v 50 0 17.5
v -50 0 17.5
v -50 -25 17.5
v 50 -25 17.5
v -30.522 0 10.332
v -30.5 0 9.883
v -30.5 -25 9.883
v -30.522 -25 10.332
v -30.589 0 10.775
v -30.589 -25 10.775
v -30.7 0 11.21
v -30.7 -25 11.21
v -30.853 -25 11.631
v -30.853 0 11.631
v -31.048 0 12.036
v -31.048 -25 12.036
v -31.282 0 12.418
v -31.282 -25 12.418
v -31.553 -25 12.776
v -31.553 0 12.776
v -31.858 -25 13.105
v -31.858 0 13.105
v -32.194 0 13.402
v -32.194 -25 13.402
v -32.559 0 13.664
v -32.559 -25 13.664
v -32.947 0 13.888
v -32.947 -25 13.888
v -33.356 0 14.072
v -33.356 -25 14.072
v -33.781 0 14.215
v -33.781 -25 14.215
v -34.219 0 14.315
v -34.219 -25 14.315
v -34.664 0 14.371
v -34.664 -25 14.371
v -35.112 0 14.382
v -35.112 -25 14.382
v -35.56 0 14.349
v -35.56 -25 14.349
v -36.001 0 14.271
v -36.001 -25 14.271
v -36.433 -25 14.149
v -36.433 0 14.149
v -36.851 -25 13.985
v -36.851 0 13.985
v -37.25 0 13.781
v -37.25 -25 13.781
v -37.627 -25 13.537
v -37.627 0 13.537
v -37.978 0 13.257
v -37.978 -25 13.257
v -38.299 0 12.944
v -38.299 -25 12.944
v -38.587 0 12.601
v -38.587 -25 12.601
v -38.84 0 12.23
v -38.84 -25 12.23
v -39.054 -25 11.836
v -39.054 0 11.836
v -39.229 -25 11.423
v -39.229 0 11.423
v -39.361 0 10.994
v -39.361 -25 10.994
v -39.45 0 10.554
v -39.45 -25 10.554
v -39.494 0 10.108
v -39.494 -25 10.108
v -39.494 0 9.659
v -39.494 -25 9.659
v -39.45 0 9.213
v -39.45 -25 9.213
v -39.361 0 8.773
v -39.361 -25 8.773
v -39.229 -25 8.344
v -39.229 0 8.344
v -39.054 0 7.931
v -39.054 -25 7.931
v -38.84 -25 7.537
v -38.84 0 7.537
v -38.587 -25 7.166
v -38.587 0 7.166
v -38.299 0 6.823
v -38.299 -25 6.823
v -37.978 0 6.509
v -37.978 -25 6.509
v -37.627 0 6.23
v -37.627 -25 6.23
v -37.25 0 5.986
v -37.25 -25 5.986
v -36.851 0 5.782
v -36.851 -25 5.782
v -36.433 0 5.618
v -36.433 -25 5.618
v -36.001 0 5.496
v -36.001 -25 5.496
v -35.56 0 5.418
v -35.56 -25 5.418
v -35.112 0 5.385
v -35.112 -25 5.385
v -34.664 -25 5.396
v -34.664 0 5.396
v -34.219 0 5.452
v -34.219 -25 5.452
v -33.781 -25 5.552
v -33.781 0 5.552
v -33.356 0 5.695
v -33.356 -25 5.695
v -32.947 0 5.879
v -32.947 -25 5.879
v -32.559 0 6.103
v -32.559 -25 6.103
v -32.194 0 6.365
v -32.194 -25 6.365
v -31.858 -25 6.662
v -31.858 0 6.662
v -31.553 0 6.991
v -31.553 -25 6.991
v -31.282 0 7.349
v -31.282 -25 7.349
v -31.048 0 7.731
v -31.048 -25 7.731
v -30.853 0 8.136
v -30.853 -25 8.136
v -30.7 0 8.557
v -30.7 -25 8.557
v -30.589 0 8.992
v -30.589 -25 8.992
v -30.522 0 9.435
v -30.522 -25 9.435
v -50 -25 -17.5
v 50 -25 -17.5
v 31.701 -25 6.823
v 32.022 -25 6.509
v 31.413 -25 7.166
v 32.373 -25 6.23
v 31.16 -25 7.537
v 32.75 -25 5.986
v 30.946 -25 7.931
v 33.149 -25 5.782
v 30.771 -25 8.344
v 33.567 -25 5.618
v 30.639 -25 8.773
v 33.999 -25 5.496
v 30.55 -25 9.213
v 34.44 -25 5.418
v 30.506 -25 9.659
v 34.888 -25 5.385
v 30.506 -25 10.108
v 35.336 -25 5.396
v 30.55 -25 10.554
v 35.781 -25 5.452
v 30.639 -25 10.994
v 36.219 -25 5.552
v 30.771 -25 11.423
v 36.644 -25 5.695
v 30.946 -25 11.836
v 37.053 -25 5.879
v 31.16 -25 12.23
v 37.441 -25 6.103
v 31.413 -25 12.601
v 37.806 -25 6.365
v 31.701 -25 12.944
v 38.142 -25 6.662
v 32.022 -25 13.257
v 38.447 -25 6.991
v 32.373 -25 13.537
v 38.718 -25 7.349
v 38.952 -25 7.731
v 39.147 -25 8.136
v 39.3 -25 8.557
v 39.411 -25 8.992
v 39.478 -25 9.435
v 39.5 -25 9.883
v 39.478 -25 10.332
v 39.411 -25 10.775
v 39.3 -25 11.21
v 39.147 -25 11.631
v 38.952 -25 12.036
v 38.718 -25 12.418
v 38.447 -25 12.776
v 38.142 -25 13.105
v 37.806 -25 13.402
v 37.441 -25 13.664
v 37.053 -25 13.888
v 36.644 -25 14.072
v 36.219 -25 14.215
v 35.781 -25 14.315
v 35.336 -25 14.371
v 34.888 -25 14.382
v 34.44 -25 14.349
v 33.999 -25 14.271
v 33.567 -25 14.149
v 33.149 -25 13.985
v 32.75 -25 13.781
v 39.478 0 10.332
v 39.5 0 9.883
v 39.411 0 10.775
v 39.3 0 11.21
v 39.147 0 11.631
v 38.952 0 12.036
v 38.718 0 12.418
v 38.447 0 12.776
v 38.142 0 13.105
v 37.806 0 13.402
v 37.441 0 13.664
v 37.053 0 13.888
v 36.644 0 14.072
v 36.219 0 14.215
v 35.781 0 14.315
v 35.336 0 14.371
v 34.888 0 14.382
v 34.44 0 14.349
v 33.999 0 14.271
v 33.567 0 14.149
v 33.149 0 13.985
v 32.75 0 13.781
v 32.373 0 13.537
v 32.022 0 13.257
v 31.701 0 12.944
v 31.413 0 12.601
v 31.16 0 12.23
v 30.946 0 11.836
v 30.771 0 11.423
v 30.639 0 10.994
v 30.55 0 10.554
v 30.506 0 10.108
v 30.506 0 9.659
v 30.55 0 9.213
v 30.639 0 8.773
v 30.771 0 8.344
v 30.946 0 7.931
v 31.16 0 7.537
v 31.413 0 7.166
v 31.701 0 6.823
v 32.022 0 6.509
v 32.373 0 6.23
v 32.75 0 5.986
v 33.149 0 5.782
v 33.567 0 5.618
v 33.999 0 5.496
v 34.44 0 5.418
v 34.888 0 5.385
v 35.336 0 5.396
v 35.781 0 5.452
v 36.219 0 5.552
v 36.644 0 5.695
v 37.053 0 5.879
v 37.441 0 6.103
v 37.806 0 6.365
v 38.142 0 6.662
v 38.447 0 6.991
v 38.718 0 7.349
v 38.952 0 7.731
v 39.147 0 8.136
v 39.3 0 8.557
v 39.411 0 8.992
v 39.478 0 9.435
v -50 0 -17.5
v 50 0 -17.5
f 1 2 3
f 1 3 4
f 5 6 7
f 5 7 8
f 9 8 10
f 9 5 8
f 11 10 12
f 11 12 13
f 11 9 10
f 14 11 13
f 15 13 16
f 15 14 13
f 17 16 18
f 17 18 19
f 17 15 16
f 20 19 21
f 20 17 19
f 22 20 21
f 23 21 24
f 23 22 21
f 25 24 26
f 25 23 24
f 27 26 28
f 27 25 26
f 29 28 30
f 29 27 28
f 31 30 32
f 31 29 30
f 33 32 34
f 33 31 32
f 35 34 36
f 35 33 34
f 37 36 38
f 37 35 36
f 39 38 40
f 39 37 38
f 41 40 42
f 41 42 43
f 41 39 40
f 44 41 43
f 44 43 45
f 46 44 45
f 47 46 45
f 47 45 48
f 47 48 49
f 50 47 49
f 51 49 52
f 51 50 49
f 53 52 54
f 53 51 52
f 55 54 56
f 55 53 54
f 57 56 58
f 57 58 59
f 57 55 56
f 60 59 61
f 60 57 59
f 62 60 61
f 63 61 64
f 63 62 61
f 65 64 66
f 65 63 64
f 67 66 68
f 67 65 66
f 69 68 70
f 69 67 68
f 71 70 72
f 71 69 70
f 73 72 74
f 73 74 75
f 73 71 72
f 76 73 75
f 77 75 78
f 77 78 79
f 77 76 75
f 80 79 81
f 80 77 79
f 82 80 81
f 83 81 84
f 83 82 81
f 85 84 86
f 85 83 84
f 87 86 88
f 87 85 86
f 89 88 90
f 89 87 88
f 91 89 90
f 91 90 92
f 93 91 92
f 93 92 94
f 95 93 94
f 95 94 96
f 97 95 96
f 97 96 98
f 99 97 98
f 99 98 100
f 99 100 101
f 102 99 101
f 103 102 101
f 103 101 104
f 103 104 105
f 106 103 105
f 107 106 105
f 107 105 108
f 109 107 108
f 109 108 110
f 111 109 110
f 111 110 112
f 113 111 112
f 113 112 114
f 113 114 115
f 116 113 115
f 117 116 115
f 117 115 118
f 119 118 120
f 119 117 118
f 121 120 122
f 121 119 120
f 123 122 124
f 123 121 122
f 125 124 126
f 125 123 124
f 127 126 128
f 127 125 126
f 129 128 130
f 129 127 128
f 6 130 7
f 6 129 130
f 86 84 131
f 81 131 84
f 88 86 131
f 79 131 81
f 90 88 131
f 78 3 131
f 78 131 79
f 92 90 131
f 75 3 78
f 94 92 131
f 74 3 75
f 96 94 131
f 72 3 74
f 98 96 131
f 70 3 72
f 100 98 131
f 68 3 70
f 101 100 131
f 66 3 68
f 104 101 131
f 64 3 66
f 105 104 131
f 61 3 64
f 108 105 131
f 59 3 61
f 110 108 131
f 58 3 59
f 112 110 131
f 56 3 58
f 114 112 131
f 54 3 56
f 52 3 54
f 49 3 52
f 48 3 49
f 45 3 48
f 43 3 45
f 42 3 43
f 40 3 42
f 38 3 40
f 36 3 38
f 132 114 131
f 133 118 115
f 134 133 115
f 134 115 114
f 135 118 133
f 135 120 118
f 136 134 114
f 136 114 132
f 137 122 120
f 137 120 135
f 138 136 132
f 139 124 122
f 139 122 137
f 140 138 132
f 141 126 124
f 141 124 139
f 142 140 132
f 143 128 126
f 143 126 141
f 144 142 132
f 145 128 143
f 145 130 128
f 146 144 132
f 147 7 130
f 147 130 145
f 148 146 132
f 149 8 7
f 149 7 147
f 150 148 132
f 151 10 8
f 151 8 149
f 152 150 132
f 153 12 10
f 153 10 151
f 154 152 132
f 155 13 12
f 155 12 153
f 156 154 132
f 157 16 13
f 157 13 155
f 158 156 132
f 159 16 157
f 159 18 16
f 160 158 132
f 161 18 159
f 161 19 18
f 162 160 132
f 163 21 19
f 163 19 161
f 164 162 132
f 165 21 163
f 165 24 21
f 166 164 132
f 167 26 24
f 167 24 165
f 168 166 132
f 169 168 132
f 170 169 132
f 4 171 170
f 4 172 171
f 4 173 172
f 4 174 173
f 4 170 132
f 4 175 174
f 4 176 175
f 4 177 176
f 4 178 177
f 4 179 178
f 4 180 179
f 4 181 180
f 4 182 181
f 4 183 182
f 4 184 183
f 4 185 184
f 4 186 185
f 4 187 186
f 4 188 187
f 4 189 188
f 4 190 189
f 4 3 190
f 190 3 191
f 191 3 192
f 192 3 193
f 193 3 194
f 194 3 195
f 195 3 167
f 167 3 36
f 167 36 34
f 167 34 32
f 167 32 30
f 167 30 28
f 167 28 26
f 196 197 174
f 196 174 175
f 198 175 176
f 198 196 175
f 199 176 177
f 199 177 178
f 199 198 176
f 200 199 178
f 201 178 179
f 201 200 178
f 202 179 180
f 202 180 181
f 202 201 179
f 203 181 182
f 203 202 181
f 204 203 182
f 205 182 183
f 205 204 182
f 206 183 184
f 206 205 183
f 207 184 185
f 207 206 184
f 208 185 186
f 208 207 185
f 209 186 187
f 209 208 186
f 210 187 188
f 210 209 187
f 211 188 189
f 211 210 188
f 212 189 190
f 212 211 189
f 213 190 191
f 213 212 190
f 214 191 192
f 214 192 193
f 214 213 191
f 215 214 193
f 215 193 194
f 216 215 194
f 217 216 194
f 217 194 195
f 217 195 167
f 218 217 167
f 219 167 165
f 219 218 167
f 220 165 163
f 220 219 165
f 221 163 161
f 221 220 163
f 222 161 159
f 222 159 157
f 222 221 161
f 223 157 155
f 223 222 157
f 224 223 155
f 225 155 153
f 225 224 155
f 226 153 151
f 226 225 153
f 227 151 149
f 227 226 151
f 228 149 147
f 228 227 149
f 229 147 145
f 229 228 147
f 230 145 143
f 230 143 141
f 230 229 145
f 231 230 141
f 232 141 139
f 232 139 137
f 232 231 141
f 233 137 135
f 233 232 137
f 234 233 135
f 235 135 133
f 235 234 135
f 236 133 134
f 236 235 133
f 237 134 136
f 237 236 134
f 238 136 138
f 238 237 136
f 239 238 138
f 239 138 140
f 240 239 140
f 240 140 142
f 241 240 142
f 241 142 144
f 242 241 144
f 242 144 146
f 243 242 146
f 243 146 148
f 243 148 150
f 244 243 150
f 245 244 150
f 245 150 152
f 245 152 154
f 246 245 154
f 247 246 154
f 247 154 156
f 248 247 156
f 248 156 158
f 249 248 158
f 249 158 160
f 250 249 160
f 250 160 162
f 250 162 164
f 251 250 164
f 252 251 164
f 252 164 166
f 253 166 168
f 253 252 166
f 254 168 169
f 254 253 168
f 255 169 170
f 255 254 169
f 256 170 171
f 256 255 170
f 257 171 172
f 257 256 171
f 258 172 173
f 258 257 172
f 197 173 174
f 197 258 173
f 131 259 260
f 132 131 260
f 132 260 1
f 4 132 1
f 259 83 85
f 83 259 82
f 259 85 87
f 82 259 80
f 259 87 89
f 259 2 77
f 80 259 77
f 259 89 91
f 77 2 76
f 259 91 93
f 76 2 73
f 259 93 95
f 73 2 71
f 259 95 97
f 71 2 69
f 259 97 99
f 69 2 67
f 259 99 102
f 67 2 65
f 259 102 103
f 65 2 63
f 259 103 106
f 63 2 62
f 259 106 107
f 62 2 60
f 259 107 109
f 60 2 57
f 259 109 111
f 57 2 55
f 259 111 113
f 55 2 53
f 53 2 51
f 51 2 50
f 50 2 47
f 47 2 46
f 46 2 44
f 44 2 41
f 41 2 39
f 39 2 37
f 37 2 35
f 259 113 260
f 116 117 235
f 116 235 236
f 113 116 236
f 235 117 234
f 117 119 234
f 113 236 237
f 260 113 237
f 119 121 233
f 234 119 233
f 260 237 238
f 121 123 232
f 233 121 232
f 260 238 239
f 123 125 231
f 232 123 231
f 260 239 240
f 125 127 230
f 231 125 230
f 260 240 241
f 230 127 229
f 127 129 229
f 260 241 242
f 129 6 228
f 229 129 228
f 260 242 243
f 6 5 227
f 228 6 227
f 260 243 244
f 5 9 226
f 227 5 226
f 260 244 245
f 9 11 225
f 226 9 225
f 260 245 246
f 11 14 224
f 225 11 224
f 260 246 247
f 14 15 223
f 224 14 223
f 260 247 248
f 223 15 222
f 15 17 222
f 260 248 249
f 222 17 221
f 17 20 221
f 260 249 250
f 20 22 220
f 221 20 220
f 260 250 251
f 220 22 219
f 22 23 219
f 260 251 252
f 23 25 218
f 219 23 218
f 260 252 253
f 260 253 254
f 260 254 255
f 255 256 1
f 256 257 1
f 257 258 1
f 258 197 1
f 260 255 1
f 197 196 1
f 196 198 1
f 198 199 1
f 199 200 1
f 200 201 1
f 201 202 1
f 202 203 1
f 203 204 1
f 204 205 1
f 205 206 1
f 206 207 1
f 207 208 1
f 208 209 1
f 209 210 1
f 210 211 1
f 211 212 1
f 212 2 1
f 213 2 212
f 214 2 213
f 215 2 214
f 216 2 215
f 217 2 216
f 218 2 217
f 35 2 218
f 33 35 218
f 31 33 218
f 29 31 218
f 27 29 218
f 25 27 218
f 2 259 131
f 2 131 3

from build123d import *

# Parameters (mm, degrees)
F0_W     = 100
F0_H     = 35
F0_R     = 4.5
F1_DEPTH = 25


with BuildPart() as f1:
    # F0 (on Front) → F1 (new body)
    with BuildSketch(Plane.XZ):
        Rectangle(F0_W, F0_H)
        with Locations((-35, 9.883461)):
            Circle(F0_R, mode=Mode.SUBTRACT)
        with Locations((35, 9.883461)):
            Circle(F0_R, mode=Mode.SUBTRACT)
    extrude(amount=F1_DEPTH)


solid = f1.part
